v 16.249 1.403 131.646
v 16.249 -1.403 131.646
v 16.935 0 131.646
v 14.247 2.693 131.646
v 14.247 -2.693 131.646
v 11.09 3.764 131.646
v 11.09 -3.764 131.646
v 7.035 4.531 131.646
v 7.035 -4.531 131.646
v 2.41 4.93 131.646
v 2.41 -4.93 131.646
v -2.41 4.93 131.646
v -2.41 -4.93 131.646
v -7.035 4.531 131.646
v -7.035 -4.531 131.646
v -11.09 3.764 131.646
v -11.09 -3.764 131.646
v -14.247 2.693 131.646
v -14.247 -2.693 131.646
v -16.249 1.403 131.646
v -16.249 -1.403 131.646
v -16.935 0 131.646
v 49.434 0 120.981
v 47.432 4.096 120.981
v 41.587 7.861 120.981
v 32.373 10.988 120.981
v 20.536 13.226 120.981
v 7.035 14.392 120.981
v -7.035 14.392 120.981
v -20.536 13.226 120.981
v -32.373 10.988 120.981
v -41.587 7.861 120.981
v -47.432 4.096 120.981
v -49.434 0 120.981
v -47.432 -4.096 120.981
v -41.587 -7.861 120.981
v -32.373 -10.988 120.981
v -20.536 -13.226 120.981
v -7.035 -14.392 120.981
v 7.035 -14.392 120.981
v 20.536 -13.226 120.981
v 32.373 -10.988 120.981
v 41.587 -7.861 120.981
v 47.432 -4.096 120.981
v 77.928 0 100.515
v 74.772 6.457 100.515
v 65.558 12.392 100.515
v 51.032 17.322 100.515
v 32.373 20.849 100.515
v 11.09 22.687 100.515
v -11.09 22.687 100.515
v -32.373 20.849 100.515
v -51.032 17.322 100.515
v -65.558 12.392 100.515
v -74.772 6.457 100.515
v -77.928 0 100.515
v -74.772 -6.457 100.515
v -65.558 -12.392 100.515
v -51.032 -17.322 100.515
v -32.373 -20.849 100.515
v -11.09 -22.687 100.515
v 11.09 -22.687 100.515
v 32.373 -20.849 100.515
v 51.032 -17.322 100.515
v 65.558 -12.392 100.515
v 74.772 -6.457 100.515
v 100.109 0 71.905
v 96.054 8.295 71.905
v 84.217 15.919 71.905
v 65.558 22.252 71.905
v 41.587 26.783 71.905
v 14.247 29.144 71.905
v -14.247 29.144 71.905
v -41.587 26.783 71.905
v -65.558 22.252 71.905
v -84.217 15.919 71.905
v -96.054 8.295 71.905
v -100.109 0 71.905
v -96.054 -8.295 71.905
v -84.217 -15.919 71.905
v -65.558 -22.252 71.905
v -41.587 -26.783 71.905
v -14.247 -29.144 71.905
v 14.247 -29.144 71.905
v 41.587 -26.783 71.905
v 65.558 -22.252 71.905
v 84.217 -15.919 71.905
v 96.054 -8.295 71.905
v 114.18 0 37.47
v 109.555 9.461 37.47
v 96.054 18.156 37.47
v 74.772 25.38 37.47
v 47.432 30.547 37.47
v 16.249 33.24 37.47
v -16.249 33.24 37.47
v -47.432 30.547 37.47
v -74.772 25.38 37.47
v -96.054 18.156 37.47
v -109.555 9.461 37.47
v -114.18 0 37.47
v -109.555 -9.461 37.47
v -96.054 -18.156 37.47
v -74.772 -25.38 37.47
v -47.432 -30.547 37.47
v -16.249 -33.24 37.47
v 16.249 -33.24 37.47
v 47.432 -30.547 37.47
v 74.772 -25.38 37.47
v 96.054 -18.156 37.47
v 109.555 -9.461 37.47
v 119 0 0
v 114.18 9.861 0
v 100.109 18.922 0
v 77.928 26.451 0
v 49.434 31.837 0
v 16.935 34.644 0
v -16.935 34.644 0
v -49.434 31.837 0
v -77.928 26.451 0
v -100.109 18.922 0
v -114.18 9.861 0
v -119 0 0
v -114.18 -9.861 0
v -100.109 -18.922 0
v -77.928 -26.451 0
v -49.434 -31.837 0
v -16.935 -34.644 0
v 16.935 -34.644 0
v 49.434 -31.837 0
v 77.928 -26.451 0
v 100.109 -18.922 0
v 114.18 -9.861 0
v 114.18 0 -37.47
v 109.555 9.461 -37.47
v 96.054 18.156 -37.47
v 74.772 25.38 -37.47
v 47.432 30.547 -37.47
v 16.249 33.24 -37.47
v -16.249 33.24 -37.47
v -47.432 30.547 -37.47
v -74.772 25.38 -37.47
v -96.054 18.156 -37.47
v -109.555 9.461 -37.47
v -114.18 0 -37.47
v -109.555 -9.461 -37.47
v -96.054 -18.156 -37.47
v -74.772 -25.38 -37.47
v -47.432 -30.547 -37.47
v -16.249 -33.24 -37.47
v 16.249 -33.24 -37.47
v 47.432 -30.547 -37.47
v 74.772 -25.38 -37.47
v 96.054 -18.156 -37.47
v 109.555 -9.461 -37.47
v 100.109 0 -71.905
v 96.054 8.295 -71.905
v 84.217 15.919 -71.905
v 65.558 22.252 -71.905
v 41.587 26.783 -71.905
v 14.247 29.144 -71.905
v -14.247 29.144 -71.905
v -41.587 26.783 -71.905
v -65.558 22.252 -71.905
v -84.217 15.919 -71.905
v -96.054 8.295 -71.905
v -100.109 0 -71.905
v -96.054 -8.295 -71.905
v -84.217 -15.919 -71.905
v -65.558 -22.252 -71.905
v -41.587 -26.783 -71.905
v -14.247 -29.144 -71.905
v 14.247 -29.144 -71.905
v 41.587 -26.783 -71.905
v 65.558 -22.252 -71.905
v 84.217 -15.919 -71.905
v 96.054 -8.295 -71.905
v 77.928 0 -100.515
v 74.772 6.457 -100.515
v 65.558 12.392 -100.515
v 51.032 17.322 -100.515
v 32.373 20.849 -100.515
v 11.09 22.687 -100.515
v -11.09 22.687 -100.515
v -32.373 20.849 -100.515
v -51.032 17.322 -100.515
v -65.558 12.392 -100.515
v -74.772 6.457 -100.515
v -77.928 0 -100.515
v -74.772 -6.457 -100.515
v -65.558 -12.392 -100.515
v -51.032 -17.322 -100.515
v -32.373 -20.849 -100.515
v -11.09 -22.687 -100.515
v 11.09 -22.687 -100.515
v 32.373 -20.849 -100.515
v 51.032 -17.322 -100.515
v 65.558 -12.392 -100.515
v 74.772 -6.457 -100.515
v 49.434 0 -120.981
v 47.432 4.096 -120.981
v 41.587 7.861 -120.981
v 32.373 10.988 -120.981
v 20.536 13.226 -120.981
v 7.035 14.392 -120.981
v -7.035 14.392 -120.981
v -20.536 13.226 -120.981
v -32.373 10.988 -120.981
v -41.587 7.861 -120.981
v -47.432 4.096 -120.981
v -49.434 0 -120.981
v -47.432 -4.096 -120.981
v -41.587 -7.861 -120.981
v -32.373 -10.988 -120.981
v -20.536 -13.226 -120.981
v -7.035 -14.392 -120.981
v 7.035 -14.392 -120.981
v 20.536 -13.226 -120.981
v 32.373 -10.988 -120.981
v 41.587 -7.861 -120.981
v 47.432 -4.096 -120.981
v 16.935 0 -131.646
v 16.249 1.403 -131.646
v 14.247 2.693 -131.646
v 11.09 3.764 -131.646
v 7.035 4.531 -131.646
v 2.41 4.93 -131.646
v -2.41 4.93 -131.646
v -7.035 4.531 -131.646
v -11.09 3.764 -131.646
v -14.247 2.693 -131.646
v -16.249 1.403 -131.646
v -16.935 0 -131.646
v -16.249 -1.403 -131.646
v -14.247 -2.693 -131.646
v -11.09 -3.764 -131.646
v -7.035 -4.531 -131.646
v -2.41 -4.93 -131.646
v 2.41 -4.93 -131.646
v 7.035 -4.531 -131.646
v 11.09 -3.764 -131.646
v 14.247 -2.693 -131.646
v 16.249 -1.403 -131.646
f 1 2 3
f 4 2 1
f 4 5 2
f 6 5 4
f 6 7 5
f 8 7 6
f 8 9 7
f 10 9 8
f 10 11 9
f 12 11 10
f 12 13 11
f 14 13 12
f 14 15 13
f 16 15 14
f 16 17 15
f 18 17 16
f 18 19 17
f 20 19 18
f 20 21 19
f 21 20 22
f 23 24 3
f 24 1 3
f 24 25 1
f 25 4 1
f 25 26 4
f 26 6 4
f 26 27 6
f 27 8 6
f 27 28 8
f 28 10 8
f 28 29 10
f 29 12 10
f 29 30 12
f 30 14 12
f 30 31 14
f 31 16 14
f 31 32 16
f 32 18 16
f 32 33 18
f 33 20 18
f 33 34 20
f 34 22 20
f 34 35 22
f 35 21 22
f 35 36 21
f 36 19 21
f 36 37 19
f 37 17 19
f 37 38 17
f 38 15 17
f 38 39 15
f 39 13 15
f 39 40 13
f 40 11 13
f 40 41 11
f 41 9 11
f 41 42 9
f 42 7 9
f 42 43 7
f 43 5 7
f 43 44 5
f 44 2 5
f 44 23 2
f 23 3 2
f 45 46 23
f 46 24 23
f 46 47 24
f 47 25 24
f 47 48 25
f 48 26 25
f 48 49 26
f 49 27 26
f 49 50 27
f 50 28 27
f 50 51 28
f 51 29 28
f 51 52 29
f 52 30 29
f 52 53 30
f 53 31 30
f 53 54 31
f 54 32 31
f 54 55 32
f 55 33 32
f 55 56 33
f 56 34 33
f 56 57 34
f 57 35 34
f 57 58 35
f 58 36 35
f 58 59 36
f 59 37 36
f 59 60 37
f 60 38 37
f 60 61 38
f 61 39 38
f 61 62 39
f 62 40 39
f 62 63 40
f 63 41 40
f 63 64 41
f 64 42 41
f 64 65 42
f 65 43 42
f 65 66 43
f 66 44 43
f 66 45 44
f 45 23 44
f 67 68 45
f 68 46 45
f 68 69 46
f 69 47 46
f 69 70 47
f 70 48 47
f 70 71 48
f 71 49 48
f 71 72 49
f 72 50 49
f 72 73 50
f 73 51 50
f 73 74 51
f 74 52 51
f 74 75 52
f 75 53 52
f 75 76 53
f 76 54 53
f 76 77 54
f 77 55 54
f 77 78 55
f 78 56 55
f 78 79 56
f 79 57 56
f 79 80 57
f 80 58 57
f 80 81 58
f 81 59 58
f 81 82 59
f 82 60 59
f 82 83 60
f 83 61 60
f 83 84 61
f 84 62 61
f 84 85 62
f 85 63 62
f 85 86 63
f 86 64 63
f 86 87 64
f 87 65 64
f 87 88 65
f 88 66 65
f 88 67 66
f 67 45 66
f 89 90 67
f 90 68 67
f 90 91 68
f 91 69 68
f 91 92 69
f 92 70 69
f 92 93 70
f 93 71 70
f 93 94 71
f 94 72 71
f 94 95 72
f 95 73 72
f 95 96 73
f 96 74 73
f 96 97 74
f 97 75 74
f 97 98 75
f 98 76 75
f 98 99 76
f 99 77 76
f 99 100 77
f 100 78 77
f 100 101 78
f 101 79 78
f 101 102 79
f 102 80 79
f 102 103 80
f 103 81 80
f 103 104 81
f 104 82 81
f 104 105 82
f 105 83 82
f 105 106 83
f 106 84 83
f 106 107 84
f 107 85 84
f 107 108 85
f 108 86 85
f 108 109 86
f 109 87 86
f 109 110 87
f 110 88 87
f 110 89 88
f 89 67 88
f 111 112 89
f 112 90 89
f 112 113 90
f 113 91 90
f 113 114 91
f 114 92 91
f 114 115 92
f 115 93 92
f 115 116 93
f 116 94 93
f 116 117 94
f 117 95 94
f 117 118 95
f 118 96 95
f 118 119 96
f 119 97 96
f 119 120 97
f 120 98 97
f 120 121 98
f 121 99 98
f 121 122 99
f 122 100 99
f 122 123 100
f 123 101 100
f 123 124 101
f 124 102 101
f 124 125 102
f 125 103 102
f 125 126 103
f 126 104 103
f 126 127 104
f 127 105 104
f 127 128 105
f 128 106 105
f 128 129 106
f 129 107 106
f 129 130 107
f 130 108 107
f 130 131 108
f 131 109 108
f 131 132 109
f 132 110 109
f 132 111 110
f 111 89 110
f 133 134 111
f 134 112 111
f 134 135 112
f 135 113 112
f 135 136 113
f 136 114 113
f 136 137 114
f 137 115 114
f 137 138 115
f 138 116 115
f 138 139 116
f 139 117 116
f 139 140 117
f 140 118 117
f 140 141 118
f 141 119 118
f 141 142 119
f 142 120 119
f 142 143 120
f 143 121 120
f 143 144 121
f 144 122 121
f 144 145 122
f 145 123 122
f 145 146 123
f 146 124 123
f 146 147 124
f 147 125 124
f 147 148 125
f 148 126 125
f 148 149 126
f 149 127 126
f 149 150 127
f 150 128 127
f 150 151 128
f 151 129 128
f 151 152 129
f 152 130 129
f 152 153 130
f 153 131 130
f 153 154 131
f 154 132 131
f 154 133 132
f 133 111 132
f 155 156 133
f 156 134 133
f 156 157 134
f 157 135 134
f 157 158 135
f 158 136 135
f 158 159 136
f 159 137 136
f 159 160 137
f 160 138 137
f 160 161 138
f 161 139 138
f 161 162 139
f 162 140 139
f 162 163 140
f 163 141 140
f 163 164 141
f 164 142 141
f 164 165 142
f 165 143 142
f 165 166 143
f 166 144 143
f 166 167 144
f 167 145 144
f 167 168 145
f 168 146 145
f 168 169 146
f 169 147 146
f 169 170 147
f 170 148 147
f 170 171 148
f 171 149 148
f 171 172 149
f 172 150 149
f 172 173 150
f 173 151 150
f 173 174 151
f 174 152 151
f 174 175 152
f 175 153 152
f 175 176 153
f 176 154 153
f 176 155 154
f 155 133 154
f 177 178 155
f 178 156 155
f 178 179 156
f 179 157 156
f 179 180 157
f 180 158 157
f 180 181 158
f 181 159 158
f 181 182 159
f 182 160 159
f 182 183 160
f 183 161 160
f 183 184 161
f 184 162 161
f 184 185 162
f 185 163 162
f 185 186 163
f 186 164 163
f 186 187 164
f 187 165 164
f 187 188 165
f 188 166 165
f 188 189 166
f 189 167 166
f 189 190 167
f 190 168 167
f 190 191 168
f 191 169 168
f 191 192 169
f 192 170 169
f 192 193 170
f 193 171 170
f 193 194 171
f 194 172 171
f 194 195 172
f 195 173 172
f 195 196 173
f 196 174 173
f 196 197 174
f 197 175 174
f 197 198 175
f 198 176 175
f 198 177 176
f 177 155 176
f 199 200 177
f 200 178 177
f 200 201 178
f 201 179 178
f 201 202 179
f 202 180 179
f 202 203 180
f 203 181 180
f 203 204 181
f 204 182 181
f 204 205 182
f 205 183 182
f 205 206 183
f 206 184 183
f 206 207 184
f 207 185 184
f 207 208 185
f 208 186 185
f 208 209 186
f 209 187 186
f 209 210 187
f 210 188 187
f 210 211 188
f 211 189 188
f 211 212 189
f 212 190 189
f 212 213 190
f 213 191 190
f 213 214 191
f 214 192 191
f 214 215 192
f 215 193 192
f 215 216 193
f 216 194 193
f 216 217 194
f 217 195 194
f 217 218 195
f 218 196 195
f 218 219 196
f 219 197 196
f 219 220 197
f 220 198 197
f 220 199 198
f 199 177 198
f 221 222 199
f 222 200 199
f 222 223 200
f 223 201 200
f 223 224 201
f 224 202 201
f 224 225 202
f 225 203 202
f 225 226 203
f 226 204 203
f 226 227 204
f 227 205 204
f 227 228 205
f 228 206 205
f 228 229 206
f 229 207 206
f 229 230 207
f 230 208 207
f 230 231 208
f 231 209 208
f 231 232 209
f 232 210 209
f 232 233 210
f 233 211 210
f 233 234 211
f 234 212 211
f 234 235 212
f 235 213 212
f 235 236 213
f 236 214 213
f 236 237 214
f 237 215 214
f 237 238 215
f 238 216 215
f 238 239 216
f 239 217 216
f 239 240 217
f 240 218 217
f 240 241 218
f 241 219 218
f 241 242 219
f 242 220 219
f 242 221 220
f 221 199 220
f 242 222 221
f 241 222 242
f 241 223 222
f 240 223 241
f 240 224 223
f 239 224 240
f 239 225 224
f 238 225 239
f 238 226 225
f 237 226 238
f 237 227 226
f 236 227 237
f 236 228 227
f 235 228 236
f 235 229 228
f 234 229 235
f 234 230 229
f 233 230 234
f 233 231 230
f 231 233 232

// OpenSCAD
// Generated by SolidPython 1.0.1 on 2020-07-29 00:46:52


scale(v = [17, 5, 19]) {
	sphere(r = 7);
}
/***********************************************
*********      SolidPython code:      **********
************************************************
 
# import packages: SolidPython
from solid import *
from solid.utils import *
from itertools import chain, combinations, permutations


class Resize:

    def __init__(self, scad_file):
        self.scad_file = scad_file
        #self.scad_file = import_scad(scad_file)
        # cone/cylinder param:
        self.r1 = 0
        self.r2 = 0
        self.h = 0
        # rectangular prism param:
        self.w = 0
        self.l = 0
        # ellipse param:
        self.r = 0

    # import OpenScad code (file name corresponds to shape)


    # classify shape + parameters
    def assign(self, param1, param2, param3):
        if self.scad_file == 'cone.scad':
            self.r1 = param1
            self.r2 = param2
            self.h = param3
        elif self.scad_file == 'cylinder.scad':
            self.r1 = param1
            self.r2 = param2
            self.h = param3
        elif self.scad_file == 'rectangularPrism.scad':
            self.h = param1
            self.l = param2
            self.w = param3
        else:
            self.r = param1
            self.h = param2

    # resize parameters
    def iterate(self):
        x = range(3, 20, 2)
        i = 1
        if self.scad_file == 'cone.scad':
            tempList = list(permutations(x, 2))
            for temp in tempList:
                param1 = temp[0]
                param2 = temp[1]
                filepath = 'produced_scad_files/' + 'cone' + str(param1) + '_' + str(param2) + '_' + '.scad'
                scad_render_to_file(cylinder(h=param1, r1=param2, r2=0), filepath)

        elif self.scad_file == 'cylinder.scad':
            tempList = list(permutations(x, 3))
            for temp in tempList:
                param1 = temp[0]
                param2 = temp[1]
                filepath = 'produced_scad_files/' + 'cylinder' + str(param1) + '_' + str(param2) + '_' + '.scad'
                scad_render_to_file(cylinder(h=param1, r1=param2, r2=param2), filepath)

        elif self.scad_file == 'rectangularPrism.scad':
            tempList = list(permutations(x, 3))
            for temp in tempList:
                param1 = temp[0]
                param2 = temp[1]
                param3 = temp[2]
                filepath = 'produced_scad_files/' + 'rectangularPrism' + str(param1) + '_' + str(param2) + '_' + str(
                    param3) + '.scad'
                scad_render_to_file(cube(size=(param1, param2, param3)), filepath)

        elif self.scad_file == 'ellipse.scad':
            tempList = list(permutations(x, 4))
            for temp in tempList:
                param1 = temp[0]
                param2 = temp[1]
                param3 = temp[2]
                param4 = temp[3]
                filepath = 'produced_scad_files/' + 'ellipse' + str(param1) + '_' + str(param2) + '_' + str(param3) + '_' + str(param4) + '.scad'
                scad_render_to_file(scale([param1, param2, param3])(sphere(r=param4)), filepath)

    def render_to_scadfile(self):
        scad_render_to_file(scad, 'example.scad') 
 
************************************************/
